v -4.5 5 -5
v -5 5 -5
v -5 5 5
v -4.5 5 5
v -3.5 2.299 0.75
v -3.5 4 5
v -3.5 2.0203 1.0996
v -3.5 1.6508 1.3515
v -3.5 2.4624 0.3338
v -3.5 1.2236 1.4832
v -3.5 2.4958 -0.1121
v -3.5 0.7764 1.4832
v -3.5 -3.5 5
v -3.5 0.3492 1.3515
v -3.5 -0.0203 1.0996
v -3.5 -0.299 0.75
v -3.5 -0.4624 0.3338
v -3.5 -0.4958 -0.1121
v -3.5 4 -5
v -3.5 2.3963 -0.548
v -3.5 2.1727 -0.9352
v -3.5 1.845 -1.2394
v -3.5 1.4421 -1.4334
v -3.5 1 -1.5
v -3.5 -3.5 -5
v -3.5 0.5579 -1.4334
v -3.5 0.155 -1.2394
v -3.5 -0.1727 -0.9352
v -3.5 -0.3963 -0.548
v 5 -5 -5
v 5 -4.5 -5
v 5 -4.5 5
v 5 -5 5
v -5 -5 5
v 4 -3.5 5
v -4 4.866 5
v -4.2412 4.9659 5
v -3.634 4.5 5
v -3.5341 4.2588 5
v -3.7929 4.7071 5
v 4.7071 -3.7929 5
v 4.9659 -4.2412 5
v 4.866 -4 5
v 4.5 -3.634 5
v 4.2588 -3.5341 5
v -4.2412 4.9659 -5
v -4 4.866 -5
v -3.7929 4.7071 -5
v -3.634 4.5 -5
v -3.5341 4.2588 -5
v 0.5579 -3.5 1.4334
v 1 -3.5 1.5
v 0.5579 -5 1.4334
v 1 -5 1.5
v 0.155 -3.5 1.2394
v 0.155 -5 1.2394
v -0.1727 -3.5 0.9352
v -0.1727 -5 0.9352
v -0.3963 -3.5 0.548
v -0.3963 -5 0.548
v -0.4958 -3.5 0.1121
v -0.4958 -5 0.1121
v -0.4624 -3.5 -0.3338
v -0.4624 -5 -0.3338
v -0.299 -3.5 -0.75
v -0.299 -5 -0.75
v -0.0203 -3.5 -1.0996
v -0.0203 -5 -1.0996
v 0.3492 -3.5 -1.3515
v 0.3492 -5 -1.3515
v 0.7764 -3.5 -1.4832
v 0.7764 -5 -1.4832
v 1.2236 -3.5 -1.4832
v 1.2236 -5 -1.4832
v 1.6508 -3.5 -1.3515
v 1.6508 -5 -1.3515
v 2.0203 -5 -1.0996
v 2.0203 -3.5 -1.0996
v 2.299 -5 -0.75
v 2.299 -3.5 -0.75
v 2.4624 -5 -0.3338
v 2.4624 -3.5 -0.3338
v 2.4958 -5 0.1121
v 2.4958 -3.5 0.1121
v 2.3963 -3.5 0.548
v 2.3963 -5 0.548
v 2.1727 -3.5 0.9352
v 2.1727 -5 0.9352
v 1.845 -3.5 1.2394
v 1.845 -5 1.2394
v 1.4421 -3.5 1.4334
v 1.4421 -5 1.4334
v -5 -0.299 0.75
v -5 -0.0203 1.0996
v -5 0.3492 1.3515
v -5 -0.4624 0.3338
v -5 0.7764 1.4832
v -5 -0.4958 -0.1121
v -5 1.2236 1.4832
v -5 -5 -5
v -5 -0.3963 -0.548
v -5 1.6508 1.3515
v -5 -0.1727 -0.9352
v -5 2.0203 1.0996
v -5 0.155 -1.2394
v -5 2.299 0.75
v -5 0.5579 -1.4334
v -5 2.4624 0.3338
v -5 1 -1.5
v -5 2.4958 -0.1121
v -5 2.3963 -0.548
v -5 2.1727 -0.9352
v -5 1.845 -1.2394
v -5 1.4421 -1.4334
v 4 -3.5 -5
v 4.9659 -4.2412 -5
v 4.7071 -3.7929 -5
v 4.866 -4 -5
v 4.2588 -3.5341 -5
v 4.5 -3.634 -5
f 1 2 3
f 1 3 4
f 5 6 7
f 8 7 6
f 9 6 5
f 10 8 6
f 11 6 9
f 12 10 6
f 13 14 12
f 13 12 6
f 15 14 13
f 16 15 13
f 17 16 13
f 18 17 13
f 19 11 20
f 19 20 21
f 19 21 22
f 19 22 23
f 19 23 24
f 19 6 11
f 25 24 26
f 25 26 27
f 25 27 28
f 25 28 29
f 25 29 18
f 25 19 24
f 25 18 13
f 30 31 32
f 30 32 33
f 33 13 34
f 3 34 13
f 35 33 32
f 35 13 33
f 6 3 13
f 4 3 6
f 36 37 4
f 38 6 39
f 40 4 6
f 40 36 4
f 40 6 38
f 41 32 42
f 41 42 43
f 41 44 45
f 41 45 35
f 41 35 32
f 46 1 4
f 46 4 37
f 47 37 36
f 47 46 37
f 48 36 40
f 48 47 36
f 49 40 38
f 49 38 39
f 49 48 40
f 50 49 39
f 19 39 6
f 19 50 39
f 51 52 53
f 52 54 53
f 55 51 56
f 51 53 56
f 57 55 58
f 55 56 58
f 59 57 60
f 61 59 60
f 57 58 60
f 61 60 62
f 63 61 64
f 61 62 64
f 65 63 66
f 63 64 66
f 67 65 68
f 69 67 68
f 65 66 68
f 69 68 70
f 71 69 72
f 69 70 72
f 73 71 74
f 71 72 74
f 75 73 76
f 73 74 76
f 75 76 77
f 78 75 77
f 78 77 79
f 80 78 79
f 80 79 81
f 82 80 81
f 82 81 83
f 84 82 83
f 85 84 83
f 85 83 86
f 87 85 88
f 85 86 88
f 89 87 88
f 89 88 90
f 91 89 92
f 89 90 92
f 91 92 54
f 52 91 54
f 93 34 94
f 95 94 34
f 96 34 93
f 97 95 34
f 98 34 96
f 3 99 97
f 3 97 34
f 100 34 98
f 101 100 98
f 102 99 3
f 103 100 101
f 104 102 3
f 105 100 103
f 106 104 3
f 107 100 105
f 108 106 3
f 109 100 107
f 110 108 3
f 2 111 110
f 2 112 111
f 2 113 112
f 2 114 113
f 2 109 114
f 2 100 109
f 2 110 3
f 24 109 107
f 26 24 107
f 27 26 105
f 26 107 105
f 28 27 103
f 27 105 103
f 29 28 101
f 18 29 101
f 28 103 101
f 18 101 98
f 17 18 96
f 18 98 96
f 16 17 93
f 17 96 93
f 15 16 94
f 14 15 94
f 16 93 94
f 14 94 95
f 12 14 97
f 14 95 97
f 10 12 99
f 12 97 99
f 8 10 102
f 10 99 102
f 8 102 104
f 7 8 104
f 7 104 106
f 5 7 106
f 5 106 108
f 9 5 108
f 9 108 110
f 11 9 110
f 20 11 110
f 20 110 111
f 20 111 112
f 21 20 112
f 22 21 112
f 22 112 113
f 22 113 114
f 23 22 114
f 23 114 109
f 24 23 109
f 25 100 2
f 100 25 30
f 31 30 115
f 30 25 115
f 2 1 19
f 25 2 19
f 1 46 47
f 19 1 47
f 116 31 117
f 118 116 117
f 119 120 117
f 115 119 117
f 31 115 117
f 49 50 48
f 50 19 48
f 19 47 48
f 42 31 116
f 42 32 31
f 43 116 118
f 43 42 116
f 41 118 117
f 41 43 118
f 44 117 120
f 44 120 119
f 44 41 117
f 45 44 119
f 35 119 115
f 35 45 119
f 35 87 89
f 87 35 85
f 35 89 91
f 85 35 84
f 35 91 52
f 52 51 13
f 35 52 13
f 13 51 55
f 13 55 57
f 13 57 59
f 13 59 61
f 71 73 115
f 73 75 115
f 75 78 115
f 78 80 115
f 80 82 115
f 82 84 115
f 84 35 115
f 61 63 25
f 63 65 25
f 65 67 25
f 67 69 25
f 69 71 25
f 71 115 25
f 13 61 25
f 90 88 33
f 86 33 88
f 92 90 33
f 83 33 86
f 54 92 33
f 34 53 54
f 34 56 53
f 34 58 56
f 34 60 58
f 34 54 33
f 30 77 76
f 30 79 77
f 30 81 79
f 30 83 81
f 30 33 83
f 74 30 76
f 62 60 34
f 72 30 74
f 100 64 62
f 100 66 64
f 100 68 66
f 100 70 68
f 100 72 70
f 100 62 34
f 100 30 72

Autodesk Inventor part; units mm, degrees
ref_plane "YZ Plane" through (0, 0, 0) normal (1, 0, 0) x (0, 1, 0)
ref_plane "XZ Plane" through (0, 0, 0) normal (0, 1, 0) x (-1, 0, 0)
ref_plane "XY Plane" through (0, 0, 0) normal (0, 0, 1) x (1, 0, 0)
sketch "Esboço1" plane through (0, 0, 0) normal (0, 0, 1) x (1, 0, 0)
  line L0 (5, -5) -> (-5, -5)
  line L1 (-5, -5) -> (-5, 5)
  line L2 (-5, 5) -> (-3.5, 5)
  line L3 (5, -3.5) -> (5, -5)
  line L4 (5, -5) -> (-5, 5) construction
  line L5 (-5, -5) -> (5, 5) construction
  line L6 (-3.5, 5) -> (-3.5, -3.5)
  line L7 (5, -3.5) -> (-3.5, -3.5)
  point P0 (0, 0)
  dimension "d0" = 10
  dimension "d1" = 10
  dimension "d2" = 1.5
  dimension "d4" = 5
  dimension "d5" = 5
extrude "Extrusão1" add sketch "Esboço1" along normal mid plane 10
fillet "Arredondamento1" radius 1 2 edges at (-3.5, 5, 0) (5, -3.5, 0)
hole "Furo1" at (1, -3.5, 0) direction (0, -1, 0) diameter 3 end through all
hole "Furo2" at (-3.5, 1, 0) direction (-1, 0, 0) diameter 3 end through all
equation "\"d4\" = 0.5 * d0"
equation "\"d5\" = 0.5 * d1"
properties part number "Cantoneira Gaveta" material "Liga de aço"
